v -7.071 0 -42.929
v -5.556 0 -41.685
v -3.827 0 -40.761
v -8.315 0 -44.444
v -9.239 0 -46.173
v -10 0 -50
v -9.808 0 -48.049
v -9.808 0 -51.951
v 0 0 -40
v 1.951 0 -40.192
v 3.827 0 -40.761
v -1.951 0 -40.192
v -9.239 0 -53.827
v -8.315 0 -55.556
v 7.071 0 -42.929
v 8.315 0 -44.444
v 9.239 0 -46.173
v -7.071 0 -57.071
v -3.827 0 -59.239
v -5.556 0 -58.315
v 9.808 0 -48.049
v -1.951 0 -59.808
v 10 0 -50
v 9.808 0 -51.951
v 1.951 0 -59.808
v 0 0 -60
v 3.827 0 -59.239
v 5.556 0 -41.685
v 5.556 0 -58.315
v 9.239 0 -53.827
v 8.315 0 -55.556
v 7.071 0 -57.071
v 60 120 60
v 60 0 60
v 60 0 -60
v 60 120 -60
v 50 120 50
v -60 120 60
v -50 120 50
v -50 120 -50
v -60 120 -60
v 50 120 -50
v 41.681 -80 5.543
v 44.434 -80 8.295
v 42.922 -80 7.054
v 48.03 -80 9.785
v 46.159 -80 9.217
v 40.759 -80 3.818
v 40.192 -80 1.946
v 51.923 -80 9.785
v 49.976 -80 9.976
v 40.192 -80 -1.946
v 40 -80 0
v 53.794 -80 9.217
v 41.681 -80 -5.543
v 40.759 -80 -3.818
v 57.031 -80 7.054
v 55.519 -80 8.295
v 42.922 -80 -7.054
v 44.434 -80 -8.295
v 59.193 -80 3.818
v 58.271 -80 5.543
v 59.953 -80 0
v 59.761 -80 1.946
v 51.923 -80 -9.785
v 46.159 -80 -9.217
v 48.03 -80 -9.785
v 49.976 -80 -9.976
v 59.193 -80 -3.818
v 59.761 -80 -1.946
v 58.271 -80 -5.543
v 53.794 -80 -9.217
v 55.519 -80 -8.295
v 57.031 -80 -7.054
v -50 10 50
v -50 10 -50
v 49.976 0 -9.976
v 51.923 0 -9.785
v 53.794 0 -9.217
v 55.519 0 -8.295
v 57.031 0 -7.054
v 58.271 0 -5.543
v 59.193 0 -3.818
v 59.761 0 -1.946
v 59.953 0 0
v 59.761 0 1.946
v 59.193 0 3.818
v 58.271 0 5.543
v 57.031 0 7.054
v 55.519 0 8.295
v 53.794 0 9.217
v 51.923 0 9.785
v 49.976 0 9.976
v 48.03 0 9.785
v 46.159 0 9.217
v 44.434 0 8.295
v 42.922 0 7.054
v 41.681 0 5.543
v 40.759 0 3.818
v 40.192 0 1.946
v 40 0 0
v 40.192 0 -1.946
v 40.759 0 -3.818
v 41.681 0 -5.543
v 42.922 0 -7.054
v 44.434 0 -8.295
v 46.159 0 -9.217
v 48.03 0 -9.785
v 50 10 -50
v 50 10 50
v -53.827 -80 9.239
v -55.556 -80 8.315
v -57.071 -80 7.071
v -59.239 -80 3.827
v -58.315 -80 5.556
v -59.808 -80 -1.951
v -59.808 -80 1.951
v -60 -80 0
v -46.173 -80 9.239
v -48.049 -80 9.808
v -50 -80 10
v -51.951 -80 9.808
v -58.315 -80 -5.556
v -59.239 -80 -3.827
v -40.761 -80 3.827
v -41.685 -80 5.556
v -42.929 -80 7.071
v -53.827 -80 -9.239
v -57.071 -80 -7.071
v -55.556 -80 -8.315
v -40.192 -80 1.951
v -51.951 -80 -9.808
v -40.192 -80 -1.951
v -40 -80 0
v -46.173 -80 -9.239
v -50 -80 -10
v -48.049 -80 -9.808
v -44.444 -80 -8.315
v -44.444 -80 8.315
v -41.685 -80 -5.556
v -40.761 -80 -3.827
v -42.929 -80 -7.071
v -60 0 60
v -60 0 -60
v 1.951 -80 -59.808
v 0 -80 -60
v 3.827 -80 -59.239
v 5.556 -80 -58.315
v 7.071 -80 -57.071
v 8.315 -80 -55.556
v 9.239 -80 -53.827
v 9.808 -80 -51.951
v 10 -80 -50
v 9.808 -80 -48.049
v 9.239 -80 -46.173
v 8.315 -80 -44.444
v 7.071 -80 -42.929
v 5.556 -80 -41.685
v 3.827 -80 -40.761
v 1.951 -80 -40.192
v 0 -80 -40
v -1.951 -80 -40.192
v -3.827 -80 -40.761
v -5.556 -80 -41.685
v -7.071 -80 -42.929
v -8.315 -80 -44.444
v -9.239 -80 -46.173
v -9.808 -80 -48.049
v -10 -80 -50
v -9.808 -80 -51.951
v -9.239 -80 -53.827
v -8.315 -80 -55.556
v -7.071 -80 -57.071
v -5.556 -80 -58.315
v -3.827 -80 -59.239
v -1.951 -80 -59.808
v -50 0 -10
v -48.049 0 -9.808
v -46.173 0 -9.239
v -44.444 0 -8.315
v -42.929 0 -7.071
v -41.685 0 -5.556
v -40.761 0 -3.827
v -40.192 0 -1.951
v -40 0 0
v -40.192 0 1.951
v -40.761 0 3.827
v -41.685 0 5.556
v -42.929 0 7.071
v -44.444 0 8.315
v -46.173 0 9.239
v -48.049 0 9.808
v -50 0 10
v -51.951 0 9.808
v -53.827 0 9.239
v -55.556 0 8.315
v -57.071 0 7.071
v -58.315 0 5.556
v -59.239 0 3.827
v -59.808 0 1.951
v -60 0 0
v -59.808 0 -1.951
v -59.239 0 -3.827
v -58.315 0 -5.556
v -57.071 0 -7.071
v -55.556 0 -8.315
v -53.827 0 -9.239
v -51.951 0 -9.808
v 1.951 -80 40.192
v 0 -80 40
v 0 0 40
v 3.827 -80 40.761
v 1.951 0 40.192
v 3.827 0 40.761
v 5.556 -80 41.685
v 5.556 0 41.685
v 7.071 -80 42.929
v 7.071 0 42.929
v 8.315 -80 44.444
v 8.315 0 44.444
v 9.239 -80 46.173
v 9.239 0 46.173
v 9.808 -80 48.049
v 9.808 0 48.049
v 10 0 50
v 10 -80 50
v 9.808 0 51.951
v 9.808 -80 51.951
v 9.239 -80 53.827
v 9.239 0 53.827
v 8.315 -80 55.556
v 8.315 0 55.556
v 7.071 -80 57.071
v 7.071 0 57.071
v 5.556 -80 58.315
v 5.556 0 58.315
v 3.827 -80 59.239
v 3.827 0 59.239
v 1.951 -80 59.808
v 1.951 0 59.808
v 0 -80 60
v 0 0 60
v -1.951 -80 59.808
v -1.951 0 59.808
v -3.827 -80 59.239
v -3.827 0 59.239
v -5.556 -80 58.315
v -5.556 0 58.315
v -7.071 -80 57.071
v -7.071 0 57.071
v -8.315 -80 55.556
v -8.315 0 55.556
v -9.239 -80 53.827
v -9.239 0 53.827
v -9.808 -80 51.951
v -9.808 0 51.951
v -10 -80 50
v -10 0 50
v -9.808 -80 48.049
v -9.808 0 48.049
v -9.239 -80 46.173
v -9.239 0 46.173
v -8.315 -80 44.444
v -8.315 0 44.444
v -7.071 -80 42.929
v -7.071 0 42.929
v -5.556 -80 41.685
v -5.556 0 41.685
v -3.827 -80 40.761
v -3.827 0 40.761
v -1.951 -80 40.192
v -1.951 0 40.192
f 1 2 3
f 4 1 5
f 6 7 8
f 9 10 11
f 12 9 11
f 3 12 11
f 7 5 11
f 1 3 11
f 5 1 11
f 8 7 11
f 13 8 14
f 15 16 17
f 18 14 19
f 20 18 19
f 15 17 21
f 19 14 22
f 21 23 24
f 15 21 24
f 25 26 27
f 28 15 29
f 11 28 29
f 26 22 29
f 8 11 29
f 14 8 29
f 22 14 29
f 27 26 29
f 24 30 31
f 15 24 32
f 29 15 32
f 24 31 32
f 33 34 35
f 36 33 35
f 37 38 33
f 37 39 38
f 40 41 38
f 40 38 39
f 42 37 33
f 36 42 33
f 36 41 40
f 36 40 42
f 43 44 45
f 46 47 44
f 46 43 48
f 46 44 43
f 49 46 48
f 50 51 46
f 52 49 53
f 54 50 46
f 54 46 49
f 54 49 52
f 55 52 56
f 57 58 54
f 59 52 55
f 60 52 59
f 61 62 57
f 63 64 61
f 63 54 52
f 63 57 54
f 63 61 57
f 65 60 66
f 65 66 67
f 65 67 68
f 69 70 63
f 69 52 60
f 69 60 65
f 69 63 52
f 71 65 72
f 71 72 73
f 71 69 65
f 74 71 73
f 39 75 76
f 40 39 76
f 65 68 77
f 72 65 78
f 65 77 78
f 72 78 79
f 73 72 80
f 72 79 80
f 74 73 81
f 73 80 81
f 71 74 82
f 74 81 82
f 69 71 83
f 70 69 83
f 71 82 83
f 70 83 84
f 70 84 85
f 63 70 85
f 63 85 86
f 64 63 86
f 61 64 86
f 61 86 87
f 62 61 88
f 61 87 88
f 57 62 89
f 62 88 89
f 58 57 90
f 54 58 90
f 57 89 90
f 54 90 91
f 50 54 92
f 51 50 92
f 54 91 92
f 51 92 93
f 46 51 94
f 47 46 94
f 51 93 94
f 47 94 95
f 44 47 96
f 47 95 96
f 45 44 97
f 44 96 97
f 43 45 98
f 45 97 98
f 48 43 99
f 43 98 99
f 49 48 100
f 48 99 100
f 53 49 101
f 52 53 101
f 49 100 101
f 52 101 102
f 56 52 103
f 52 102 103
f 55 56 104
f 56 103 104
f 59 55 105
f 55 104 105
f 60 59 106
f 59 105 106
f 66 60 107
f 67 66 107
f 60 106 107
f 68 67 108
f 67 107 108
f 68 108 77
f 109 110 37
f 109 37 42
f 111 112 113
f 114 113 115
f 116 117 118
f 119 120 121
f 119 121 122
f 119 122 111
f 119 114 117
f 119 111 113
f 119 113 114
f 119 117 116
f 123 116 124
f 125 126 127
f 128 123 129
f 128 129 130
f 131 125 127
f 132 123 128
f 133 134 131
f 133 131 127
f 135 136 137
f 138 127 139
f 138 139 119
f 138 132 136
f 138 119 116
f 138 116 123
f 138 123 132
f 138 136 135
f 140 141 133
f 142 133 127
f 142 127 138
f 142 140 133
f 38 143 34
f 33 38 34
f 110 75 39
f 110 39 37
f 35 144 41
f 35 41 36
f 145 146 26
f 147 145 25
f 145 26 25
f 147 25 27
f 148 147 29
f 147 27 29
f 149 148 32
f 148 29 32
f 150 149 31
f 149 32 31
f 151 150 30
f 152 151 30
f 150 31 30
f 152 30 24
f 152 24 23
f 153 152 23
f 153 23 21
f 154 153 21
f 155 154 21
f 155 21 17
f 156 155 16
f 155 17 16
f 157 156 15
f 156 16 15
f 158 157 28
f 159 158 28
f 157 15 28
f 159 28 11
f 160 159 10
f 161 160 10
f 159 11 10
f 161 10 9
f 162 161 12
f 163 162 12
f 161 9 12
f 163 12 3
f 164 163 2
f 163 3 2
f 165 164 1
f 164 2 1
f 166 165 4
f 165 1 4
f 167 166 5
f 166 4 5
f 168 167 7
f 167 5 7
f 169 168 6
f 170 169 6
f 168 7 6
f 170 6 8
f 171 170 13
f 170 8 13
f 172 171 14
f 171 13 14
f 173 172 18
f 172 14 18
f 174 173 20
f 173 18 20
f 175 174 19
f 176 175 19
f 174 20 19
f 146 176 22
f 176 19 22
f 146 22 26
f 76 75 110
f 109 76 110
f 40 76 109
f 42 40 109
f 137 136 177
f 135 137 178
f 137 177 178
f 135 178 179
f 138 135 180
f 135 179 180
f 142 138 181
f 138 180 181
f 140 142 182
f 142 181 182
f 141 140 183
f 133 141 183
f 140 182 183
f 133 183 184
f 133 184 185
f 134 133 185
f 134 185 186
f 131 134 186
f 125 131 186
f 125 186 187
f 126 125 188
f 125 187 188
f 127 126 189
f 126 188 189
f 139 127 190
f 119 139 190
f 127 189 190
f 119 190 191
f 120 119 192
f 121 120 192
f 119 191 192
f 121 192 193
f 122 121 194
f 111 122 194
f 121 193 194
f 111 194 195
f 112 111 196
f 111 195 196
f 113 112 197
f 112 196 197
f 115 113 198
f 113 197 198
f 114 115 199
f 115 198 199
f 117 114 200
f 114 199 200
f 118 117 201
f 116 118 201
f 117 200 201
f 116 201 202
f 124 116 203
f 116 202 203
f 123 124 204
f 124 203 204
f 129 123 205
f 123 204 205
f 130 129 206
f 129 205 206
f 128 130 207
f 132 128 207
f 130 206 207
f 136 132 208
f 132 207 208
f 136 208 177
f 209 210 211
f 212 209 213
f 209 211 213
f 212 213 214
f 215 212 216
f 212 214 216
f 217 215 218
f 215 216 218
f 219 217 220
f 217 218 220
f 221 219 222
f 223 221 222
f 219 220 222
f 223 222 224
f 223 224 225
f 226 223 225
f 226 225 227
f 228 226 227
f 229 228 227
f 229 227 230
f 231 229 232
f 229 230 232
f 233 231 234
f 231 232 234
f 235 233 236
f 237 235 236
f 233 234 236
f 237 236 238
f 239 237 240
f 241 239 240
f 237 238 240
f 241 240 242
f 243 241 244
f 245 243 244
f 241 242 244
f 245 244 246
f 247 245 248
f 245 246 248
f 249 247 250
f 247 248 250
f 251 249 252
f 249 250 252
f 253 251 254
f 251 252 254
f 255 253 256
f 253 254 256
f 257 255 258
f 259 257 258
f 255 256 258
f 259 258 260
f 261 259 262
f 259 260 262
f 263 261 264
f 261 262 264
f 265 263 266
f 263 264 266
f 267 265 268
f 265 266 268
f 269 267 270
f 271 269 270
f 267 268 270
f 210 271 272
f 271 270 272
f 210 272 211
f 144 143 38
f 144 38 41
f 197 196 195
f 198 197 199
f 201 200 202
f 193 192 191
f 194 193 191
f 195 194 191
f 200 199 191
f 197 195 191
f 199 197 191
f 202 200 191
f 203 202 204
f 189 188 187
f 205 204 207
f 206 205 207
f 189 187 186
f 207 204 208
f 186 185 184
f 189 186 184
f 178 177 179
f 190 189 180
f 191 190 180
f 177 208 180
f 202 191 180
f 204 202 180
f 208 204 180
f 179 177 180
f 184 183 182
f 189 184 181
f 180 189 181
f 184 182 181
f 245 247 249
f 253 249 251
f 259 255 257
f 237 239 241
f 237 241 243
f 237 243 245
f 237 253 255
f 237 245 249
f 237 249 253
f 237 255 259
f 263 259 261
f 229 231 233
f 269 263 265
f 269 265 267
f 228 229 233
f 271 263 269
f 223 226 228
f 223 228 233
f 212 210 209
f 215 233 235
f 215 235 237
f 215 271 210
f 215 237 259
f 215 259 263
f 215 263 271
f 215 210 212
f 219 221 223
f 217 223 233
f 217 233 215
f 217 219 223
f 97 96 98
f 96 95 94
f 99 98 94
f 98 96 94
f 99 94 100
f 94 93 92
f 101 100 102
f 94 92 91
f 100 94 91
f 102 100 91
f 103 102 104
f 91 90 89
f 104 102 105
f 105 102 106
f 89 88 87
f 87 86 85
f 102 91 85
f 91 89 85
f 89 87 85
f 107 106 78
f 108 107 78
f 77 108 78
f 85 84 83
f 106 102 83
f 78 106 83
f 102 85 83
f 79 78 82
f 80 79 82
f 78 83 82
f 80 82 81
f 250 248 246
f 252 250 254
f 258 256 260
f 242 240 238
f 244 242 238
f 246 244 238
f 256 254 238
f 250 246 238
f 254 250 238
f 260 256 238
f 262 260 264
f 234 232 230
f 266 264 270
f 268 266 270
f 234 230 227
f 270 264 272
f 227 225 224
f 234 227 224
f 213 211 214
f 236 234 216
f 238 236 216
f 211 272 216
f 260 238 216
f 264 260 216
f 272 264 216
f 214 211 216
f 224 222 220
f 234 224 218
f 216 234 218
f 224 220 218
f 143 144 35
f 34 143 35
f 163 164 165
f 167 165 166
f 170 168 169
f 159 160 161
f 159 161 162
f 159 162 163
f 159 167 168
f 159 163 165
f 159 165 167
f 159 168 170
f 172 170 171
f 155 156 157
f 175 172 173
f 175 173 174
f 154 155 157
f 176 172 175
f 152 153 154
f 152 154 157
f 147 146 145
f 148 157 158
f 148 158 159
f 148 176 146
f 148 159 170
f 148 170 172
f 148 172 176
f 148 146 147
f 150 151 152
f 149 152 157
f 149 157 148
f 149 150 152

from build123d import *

# Parameters (mm, degrees)
SKETCH2_W             = 120
SKETCH2_H             = 120
SKETCH2_W_2           = 100
SKETCH2_H_2           = 100
BOSS_EXTRUDE1_DEPTH   = 120
SKETCH3_W             = 120
SKETCH3_H             = 120
BOSS_EXTRUDE2_DEPTH   = 10
SKETCH4_W             = 80
SKETCH4_H             = 80
BOSS_EXTRUDE3_DEPTH   = 30
SKETCH5_R             = 25
CUT_EXTRUDE2_DEPTH    = 25
FILLET1_R             = 25
SKETCH7_R             = 10
BOSS_EXTRUDE5_DEPTH   = 80
SKETCH7_R_2           = 9.976410379
BOSS_EXTRUDE5_2_DEPTH = 80
BOSS_EXTRUDE5_3_DEPTH = 80
BOSS_EXTRUDE5_4_DEPTH = 80
SKETCH8_W             = 80
SKETCH8_H             = 80
CUT_EXTRUDE4_DEPTH    = 30


with BuildPart() as part:
    # Sketch2 → Boss-Extrude1 (new body)
    with BuildSketch(Plane(origin=(0, 0, 0), x_dir=(1, 0, 0), z_dir=(0, 1, 0))):
        Rectangle(SKETCH2_W, SKETCH2_H)
        Rectangle(SKETCH2_W_2, SKETCH2_H_2, mode=Mode.SUBTRACT)
    extrude(amount=BOSS_EXTRUDE1_DEPTH)

    # Sketch3 → Boss-Extrude2 (add)
    with BuildSketch(Plane.XZ):
        Rectangle(SKETCH3_W, SKETCH3_H)
    extrude(amount=-BOSS_EXTRUDE2_DEPTH)

    # Sketch4 → Boss-Extrude3 (add)
    with BuildSketch(Plane.XZ):
        Rectangle(SKETCH4_W, SKETCH4_H)
    extrude(amount=BOSS_EXTRUDE3_DEPTH)

    # Sketch5 → Cut-Extrude2 (cut)
    with BuildSketch(Plane(origin=(0, -30, 0), x_dir=(-1, 0, 0), z_dir=(0, -1, 0))):
        with Locations(Location((0, 0, 0), (0, 0, 90))):
            Circle(SKETCH5_R)
    extrude(amount=-CUT_EXTRUDE2_DEPTH, mode=Mode.SUBTRACT)

    # Fillet1
    fillet1_edges = [part.edges().sort_by_distance(p)[0] for p in [
        (0, -5, 25),
    ]]
    fillet(fillet1_edges, radius=FILLET1_R - 0.0001)  # a hair under: the kernel refuses the full size

    # Sketch8 → Cut-Extrude4 (cut)
    with BuildSketch(Plane.XZ.offset(30)):
        Rectangle(SKETCH8_W, SKETCH8_H)
    extrude(amount=-CUT_EXTRUDE4_DEPTH, mode=Mode.SUBTRACT)


with BuildPart() as body_2:
    # Sketch7 → Boss-Extrude5 (new body)
    with BuildSketch(Plane.XZ):
        with Locations(Location((0, -50, 0), (0, 0, 270))):
            Circle(SKETCH7_R)
    extrude(amount=BOSS_EXTRUDE5_DEPTH)


with BuildPart() as body_3:
    # Sketch7 → Boss-Extrude5 2 (new body)
    with BuildSketch(Plane.XZ):
        with Locations(Location((49.976410379, 0, 0), (0, 0, 270))):
            Circle(SKETCH7_R_2)
    extrude(amount=BOSS_EXTRUDE5_2_DEPTH)


with BuildPart() as body_4:
    # Sketch7 → Boss-Extrude5 3 (new body)
    with BuildSketch(Plane.XZ):
        with Locations(Location((0, 50, 0), (0, 0, 270))):
            Circle(SKETCH7_R)
    extrude(amount=BOSS_EXTRUDE5_3_DEPTH)


with BuildPart() as body_5:
    # Sketch7 → Boss-Extrude5 4 (new body)
    with BuildSketch(Plane.XZ):
        with Locations(Location((-50, 0, 0), (0, 0, 270))):
            Circle(SKETCH7_R)
    extrude(amount=BOSS_EXTRUDE5_4_DEPTH)


solid = Compound([part.part, body_2.part, body_3.part, body_4.part, body_5.part])
